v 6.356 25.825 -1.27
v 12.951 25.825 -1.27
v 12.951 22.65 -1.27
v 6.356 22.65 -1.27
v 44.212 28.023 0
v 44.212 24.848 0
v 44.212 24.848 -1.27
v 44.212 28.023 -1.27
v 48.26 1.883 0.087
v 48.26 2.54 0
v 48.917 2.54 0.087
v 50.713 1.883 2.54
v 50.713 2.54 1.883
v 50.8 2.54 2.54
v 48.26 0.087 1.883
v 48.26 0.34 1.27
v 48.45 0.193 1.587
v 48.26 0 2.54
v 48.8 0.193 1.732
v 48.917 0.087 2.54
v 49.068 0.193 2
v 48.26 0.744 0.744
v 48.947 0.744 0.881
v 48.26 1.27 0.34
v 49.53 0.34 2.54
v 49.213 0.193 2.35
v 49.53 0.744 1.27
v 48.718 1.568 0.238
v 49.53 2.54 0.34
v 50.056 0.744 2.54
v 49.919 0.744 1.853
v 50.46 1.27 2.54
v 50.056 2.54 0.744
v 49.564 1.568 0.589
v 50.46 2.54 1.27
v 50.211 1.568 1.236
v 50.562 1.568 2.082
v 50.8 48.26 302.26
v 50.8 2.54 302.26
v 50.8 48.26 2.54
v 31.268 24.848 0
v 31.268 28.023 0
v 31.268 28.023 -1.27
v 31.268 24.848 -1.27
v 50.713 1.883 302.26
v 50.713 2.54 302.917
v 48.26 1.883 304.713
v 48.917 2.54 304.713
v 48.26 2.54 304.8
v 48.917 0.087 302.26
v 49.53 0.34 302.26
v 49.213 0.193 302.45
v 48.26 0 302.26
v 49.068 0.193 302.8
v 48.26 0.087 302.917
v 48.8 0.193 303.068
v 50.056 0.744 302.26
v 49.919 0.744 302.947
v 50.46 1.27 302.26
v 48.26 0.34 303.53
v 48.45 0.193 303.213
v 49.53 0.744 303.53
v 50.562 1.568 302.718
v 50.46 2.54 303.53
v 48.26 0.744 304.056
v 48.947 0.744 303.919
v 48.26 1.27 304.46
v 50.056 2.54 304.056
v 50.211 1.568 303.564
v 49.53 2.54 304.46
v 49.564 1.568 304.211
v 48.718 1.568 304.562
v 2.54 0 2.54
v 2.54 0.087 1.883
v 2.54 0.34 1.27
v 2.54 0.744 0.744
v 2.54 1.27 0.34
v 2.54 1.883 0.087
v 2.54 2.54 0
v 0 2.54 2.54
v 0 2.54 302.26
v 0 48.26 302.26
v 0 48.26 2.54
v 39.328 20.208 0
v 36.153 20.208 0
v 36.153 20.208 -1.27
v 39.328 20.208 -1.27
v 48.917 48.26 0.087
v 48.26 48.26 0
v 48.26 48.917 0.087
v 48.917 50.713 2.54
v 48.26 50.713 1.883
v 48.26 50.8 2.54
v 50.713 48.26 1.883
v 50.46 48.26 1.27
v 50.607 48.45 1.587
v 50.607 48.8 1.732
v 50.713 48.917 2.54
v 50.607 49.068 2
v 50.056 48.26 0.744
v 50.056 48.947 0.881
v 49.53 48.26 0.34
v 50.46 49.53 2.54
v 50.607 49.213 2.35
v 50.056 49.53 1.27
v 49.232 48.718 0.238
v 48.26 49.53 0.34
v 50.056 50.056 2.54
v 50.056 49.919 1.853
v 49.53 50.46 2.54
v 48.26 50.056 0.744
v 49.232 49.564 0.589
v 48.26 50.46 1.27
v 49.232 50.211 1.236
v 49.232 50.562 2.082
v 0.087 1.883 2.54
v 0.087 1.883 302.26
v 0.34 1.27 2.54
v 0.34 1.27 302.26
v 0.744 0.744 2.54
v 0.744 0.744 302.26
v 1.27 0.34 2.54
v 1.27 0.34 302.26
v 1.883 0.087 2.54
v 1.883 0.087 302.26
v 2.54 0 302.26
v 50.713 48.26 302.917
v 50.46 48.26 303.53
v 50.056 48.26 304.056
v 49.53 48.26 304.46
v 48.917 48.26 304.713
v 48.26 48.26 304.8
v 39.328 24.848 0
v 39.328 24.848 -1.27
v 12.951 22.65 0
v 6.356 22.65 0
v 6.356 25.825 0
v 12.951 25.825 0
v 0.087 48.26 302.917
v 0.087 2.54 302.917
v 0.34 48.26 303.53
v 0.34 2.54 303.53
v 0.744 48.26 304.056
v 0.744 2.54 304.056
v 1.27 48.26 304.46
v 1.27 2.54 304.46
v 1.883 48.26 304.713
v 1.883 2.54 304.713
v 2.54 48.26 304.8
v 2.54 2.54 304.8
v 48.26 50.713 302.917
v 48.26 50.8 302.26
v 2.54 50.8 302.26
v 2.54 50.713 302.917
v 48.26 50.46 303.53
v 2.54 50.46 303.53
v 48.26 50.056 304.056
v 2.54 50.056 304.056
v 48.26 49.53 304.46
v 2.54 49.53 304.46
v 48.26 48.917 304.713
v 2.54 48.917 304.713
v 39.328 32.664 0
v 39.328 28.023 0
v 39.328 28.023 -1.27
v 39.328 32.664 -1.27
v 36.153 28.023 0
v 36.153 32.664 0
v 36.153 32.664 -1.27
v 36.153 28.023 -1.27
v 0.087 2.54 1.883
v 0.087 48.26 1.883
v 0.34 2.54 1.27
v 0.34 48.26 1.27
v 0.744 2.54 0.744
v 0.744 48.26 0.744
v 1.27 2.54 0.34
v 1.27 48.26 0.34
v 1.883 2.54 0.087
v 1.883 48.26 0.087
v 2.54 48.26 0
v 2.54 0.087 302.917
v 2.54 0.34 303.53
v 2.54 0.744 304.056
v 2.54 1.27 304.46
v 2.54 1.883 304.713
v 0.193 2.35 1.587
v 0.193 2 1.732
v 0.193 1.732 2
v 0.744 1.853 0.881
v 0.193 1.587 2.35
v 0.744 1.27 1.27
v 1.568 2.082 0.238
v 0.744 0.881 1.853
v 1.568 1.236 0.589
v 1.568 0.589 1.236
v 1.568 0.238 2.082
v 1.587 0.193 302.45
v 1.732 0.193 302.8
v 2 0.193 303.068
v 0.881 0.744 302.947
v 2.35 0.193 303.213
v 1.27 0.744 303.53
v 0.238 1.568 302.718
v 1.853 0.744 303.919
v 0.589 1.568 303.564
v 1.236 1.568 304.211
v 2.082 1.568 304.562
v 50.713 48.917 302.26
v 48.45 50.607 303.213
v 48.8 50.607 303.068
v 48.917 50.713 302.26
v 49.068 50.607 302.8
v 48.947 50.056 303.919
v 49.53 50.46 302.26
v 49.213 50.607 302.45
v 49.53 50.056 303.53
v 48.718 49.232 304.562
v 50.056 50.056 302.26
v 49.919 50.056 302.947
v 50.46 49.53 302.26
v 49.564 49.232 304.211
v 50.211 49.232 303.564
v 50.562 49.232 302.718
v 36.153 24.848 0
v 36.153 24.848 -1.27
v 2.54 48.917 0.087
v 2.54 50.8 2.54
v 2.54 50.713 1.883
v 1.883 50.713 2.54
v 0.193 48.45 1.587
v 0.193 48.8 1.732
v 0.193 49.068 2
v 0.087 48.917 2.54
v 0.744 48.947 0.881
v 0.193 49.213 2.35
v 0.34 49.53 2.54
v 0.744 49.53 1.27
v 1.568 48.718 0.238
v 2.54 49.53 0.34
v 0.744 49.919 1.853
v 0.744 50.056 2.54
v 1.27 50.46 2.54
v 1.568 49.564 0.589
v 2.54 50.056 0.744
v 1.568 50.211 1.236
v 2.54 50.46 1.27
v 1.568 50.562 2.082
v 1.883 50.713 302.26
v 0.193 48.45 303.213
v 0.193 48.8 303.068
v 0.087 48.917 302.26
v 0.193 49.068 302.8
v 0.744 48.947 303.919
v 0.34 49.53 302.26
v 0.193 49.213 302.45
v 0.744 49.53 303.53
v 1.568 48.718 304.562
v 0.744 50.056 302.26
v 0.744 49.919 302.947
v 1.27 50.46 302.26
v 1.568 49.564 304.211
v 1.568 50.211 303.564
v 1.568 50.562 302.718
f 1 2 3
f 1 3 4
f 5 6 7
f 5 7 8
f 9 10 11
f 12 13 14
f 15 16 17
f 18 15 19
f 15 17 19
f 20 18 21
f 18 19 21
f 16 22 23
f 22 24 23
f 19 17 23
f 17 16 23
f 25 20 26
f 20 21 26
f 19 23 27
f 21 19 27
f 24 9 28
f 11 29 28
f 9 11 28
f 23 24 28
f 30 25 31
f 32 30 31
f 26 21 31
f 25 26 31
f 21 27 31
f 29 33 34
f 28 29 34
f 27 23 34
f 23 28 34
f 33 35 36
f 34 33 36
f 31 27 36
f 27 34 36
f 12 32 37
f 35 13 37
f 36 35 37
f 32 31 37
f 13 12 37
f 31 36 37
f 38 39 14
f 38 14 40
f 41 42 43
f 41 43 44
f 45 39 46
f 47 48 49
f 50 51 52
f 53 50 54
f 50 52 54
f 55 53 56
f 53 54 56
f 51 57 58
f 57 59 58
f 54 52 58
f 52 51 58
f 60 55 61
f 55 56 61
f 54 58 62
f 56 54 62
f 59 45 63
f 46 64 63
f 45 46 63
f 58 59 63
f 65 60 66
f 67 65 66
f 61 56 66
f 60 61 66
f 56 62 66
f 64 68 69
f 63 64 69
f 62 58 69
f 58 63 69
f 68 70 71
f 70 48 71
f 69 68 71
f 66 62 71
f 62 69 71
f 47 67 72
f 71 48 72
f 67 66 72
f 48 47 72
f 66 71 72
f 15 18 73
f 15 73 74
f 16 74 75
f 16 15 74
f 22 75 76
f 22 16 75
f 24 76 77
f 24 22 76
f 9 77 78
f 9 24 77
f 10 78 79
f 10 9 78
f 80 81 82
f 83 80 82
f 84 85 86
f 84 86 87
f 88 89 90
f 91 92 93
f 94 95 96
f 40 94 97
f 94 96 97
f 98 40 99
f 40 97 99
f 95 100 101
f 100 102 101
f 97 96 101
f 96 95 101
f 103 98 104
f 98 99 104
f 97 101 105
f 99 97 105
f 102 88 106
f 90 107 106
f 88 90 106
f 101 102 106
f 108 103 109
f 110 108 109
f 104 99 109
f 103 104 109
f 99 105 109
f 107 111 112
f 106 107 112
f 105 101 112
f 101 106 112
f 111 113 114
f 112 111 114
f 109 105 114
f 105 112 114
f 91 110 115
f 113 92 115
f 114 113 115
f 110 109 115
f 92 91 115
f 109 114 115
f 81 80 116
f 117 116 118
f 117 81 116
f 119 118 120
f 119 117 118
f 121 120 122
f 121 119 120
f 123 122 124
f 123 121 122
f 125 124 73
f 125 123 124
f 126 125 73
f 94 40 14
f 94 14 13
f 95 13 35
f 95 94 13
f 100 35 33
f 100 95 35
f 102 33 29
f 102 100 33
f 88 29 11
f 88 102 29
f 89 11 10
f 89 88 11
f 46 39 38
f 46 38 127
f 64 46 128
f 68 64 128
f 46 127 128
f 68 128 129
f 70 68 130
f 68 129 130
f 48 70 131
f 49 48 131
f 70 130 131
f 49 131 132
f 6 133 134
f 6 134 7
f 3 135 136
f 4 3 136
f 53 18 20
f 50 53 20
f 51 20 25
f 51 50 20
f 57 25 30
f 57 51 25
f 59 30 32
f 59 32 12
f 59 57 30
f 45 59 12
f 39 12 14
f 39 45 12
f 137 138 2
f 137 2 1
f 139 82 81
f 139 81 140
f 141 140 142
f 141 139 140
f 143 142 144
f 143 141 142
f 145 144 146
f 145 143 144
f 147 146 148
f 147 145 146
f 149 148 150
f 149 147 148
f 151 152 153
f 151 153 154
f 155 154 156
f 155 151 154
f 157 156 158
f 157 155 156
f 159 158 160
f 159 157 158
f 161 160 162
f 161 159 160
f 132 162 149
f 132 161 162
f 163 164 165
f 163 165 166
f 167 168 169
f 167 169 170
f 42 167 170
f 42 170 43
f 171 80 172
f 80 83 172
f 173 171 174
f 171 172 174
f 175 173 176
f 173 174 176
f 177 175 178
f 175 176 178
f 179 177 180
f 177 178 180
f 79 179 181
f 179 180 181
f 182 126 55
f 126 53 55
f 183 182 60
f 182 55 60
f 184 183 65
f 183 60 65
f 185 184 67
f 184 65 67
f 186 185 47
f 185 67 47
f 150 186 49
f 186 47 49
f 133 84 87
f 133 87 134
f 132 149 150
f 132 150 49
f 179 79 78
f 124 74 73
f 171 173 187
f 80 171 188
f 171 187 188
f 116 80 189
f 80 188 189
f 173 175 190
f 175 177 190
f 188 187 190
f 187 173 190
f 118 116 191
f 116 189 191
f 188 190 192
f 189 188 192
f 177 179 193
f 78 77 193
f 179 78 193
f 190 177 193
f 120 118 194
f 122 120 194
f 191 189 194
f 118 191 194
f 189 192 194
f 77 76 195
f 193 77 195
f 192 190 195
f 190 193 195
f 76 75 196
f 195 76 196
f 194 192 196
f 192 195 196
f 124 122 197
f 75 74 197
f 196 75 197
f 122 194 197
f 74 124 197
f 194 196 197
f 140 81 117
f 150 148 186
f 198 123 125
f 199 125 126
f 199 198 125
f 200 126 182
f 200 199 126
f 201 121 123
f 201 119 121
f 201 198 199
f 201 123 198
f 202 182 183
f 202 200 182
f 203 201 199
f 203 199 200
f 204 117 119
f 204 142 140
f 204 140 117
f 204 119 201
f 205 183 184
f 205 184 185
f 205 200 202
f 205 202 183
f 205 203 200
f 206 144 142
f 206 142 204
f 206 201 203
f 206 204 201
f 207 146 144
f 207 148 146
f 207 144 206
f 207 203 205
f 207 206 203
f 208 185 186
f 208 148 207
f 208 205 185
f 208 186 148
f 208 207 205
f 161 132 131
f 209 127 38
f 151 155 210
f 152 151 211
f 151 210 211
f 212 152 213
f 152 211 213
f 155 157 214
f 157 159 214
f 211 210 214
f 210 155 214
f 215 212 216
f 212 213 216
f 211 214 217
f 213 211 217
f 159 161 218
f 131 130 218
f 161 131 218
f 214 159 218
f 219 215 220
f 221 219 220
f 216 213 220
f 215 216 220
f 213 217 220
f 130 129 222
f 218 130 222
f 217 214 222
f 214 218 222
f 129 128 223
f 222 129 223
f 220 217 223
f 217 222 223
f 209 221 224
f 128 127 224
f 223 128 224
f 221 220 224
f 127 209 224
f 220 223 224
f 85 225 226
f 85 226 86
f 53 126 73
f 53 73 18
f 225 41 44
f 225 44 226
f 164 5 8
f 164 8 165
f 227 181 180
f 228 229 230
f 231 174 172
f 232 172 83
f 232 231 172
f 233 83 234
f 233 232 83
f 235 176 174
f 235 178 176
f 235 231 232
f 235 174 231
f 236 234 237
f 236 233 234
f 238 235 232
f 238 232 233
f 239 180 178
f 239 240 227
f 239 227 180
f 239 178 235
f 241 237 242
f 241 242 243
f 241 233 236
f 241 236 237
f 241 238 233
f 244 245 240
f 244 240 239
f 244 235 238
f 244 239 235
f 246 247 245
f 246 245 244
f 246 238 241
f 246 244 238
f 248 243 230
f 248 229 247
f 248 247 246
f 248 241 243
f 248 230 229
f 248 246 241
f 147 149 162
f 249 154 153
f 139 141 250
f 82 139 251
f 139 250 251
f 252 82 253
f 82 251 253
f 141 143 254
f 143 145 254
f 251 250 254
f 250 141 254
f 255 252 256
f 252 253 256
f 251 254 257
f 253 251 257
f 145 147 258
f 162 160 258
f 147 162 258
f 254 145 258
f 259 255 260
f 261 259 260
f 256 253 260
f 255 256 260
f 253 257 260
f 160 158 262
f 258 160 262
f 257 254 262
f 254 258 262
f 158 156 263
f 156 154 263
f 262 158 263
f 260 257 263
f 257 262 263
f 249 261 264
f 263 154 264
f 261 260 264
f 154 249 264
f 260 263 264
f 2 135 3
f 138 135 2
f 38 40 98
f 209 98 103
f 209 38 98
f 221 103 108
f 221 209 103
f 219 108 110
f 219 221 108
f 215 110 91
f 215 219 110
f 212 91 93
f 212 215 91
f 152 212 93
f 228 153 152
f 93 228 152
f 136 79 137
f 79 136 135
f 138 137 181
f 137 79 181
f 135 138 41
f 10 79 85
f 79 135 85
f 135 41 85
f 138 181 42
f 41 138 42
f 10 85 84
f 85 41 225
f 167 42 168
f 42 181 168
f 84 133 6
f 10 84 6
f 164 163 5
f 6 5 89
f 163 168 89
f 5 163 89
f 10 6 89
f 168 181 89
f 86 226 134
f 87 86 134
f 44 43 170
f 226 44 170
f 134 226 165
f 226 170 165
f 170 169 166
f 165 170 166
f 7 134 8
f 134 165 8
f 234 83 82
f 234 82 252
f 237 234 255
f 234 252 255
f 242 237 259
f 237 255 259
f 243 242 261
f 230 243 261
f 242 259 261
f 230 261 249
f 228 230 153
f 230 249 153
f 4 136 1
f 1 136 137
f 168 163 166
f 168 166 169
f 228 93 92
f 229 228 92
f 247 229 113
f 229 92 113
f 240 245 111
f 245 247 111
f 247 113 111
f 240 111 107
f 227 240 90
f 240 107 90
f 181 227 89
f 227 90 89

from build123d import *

# Parameters (mm, degrees)
SKETCH2_W           = 50.8
SKETCH2_H           = 50.8
BOSS_EXTRUDE1_DEPTH = 304.8
FILLET1_R           = 2.54
SKETCH3_W           = 6.594230769
SKETCH3_H           = 3.175
BOSS_EXTRUDE2_DEPTH = 1.27


with BuildPart() as part:
    # Sketch2 → Boss-Extrude1 (new body)
    with BuildSketch(Plane.XY):
        with Locations((25.4, 25.4)):
            Rectangle(SKETCH2_W, SKETCH2_H)
    extrude(amount=BOSS_EXTRUDE1_DEPTH)

    # Fillet1
    fillet1_edges = [part.edges().sort_by_distance(p)[0] for p in [
        (50.8, 25.4, 304.8),
        (25.4, 50.8, 304.8),
        (0, 25.4, 304.8),
        (25.4, 50.8, 0),
        (50.8, 25.4, 0),
        (25.4, 0, 0),
        (0, 25.4, 0),
        (0, 50.8, 152.4),
        (50.8, 50.8, 152.4),
        (50.8, 0, 152.4),
        (0, 0, 152.4),
        (25.4, 0, 304.8),
    ]]
    fillet(fillet1_edges, radius=FILLET1_R)

    # Sketch3 → Boss-Extrude2 (add)
    with BuildSketch(Plane(origin=(0, 0, 0), x_dir=(-1, 0, 0), z_dir=(0, 0, -1))):
        Polygon((-39.327558634, 28.023350903), (-39.327558634, 32.663735519), (-36.152558634, 32.663735519), (-36.152558634, 28.023350903), (-31.267943249, 28.023350903), (-31.267943249, 24.848350903), (-36.152558634, 24.848350903), (-36.152558634, 20.207966288), (-39.327558634, 20.207966288), (-39.327558634, 24.848350903), (-44.212174018, 24.848350903), (-44.212174018, 28.023350903), align=None)
        with Locations((-9.653520173, 24.23777398)):
            Rectangle(SKETCH3_W, SKETCH3_H)
    extrude(amount=BOSS_EXTRUDE2_DEPTH)


solid = part.part
